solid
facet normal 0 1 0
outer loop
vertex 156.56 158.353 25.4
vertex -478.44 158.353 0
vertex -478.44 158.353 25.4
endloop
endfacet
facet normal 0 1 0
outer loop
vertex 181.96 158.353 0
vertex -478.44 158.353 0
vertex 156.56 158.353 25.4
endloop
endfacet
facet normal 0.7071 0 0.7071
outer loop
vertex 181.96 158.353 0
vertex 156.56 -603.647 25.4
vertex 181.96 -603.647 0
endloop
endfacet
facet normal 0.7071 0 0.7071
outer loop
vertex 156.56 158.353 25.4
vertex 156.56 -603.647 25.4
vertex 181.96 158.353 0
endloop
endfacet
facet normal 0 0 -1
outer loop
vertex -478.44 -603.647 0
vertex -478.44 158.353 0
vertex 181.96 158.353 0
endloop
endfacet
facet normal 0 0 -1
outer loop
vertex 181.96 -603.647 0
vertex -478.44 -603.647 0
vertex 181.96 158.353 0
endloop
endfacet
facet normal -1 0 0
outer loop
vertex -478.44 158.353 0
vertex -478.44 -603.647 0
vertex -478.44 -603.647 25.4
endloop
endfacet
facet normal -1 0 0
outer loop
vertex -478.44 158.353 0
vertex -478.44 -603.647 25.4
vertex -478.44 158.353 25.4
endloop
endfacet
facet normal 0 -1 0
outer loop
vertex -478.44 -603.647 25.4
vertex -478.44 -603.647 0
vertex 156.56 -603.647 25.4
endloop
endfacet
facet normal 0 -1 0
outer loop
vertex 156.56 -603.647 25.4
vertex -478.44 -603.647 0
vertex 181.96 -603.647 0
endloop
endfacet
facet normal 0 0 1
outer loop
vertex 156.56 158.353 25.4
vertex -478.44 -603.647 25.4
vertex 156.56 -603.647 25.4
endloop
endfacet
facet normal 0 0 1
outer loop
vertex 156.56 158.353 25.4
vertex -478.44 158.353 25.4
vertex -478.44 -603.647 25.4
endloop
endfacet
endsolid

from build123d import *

# Parameters (mm, degrees)
F0_W     = 660.4
F0_H     = 762
F1_DEPTH = 25.4
F2_SIZE  = 25.39999


# Not quite as in the source:
# - a fillet or chamfer is up to 0.001 mm smaller than in the source, because OpenCascade refuses the exact size


with BuildPart() as f1:
    # F0 (on Top) → F1 (new body)
    with BuildSketch(Plane.XY):
        with Locations((-148.2397035837, -222.647351265)):
            Rectangle(F0_W, F0_H)
    extrude(amount=F1_DEPTH)

    # F2 (size 25.4 in the source; OpenCascade refuses exactly that, so slightly less here)
    f2_edges = [f1.edges().sort_by_distance(p)[0] for p in [
        (181.960296, -222.647351, 25.4),
    ]]
    chamfer(f2_edges, length=F2_SIZE)


solid = f1.part
